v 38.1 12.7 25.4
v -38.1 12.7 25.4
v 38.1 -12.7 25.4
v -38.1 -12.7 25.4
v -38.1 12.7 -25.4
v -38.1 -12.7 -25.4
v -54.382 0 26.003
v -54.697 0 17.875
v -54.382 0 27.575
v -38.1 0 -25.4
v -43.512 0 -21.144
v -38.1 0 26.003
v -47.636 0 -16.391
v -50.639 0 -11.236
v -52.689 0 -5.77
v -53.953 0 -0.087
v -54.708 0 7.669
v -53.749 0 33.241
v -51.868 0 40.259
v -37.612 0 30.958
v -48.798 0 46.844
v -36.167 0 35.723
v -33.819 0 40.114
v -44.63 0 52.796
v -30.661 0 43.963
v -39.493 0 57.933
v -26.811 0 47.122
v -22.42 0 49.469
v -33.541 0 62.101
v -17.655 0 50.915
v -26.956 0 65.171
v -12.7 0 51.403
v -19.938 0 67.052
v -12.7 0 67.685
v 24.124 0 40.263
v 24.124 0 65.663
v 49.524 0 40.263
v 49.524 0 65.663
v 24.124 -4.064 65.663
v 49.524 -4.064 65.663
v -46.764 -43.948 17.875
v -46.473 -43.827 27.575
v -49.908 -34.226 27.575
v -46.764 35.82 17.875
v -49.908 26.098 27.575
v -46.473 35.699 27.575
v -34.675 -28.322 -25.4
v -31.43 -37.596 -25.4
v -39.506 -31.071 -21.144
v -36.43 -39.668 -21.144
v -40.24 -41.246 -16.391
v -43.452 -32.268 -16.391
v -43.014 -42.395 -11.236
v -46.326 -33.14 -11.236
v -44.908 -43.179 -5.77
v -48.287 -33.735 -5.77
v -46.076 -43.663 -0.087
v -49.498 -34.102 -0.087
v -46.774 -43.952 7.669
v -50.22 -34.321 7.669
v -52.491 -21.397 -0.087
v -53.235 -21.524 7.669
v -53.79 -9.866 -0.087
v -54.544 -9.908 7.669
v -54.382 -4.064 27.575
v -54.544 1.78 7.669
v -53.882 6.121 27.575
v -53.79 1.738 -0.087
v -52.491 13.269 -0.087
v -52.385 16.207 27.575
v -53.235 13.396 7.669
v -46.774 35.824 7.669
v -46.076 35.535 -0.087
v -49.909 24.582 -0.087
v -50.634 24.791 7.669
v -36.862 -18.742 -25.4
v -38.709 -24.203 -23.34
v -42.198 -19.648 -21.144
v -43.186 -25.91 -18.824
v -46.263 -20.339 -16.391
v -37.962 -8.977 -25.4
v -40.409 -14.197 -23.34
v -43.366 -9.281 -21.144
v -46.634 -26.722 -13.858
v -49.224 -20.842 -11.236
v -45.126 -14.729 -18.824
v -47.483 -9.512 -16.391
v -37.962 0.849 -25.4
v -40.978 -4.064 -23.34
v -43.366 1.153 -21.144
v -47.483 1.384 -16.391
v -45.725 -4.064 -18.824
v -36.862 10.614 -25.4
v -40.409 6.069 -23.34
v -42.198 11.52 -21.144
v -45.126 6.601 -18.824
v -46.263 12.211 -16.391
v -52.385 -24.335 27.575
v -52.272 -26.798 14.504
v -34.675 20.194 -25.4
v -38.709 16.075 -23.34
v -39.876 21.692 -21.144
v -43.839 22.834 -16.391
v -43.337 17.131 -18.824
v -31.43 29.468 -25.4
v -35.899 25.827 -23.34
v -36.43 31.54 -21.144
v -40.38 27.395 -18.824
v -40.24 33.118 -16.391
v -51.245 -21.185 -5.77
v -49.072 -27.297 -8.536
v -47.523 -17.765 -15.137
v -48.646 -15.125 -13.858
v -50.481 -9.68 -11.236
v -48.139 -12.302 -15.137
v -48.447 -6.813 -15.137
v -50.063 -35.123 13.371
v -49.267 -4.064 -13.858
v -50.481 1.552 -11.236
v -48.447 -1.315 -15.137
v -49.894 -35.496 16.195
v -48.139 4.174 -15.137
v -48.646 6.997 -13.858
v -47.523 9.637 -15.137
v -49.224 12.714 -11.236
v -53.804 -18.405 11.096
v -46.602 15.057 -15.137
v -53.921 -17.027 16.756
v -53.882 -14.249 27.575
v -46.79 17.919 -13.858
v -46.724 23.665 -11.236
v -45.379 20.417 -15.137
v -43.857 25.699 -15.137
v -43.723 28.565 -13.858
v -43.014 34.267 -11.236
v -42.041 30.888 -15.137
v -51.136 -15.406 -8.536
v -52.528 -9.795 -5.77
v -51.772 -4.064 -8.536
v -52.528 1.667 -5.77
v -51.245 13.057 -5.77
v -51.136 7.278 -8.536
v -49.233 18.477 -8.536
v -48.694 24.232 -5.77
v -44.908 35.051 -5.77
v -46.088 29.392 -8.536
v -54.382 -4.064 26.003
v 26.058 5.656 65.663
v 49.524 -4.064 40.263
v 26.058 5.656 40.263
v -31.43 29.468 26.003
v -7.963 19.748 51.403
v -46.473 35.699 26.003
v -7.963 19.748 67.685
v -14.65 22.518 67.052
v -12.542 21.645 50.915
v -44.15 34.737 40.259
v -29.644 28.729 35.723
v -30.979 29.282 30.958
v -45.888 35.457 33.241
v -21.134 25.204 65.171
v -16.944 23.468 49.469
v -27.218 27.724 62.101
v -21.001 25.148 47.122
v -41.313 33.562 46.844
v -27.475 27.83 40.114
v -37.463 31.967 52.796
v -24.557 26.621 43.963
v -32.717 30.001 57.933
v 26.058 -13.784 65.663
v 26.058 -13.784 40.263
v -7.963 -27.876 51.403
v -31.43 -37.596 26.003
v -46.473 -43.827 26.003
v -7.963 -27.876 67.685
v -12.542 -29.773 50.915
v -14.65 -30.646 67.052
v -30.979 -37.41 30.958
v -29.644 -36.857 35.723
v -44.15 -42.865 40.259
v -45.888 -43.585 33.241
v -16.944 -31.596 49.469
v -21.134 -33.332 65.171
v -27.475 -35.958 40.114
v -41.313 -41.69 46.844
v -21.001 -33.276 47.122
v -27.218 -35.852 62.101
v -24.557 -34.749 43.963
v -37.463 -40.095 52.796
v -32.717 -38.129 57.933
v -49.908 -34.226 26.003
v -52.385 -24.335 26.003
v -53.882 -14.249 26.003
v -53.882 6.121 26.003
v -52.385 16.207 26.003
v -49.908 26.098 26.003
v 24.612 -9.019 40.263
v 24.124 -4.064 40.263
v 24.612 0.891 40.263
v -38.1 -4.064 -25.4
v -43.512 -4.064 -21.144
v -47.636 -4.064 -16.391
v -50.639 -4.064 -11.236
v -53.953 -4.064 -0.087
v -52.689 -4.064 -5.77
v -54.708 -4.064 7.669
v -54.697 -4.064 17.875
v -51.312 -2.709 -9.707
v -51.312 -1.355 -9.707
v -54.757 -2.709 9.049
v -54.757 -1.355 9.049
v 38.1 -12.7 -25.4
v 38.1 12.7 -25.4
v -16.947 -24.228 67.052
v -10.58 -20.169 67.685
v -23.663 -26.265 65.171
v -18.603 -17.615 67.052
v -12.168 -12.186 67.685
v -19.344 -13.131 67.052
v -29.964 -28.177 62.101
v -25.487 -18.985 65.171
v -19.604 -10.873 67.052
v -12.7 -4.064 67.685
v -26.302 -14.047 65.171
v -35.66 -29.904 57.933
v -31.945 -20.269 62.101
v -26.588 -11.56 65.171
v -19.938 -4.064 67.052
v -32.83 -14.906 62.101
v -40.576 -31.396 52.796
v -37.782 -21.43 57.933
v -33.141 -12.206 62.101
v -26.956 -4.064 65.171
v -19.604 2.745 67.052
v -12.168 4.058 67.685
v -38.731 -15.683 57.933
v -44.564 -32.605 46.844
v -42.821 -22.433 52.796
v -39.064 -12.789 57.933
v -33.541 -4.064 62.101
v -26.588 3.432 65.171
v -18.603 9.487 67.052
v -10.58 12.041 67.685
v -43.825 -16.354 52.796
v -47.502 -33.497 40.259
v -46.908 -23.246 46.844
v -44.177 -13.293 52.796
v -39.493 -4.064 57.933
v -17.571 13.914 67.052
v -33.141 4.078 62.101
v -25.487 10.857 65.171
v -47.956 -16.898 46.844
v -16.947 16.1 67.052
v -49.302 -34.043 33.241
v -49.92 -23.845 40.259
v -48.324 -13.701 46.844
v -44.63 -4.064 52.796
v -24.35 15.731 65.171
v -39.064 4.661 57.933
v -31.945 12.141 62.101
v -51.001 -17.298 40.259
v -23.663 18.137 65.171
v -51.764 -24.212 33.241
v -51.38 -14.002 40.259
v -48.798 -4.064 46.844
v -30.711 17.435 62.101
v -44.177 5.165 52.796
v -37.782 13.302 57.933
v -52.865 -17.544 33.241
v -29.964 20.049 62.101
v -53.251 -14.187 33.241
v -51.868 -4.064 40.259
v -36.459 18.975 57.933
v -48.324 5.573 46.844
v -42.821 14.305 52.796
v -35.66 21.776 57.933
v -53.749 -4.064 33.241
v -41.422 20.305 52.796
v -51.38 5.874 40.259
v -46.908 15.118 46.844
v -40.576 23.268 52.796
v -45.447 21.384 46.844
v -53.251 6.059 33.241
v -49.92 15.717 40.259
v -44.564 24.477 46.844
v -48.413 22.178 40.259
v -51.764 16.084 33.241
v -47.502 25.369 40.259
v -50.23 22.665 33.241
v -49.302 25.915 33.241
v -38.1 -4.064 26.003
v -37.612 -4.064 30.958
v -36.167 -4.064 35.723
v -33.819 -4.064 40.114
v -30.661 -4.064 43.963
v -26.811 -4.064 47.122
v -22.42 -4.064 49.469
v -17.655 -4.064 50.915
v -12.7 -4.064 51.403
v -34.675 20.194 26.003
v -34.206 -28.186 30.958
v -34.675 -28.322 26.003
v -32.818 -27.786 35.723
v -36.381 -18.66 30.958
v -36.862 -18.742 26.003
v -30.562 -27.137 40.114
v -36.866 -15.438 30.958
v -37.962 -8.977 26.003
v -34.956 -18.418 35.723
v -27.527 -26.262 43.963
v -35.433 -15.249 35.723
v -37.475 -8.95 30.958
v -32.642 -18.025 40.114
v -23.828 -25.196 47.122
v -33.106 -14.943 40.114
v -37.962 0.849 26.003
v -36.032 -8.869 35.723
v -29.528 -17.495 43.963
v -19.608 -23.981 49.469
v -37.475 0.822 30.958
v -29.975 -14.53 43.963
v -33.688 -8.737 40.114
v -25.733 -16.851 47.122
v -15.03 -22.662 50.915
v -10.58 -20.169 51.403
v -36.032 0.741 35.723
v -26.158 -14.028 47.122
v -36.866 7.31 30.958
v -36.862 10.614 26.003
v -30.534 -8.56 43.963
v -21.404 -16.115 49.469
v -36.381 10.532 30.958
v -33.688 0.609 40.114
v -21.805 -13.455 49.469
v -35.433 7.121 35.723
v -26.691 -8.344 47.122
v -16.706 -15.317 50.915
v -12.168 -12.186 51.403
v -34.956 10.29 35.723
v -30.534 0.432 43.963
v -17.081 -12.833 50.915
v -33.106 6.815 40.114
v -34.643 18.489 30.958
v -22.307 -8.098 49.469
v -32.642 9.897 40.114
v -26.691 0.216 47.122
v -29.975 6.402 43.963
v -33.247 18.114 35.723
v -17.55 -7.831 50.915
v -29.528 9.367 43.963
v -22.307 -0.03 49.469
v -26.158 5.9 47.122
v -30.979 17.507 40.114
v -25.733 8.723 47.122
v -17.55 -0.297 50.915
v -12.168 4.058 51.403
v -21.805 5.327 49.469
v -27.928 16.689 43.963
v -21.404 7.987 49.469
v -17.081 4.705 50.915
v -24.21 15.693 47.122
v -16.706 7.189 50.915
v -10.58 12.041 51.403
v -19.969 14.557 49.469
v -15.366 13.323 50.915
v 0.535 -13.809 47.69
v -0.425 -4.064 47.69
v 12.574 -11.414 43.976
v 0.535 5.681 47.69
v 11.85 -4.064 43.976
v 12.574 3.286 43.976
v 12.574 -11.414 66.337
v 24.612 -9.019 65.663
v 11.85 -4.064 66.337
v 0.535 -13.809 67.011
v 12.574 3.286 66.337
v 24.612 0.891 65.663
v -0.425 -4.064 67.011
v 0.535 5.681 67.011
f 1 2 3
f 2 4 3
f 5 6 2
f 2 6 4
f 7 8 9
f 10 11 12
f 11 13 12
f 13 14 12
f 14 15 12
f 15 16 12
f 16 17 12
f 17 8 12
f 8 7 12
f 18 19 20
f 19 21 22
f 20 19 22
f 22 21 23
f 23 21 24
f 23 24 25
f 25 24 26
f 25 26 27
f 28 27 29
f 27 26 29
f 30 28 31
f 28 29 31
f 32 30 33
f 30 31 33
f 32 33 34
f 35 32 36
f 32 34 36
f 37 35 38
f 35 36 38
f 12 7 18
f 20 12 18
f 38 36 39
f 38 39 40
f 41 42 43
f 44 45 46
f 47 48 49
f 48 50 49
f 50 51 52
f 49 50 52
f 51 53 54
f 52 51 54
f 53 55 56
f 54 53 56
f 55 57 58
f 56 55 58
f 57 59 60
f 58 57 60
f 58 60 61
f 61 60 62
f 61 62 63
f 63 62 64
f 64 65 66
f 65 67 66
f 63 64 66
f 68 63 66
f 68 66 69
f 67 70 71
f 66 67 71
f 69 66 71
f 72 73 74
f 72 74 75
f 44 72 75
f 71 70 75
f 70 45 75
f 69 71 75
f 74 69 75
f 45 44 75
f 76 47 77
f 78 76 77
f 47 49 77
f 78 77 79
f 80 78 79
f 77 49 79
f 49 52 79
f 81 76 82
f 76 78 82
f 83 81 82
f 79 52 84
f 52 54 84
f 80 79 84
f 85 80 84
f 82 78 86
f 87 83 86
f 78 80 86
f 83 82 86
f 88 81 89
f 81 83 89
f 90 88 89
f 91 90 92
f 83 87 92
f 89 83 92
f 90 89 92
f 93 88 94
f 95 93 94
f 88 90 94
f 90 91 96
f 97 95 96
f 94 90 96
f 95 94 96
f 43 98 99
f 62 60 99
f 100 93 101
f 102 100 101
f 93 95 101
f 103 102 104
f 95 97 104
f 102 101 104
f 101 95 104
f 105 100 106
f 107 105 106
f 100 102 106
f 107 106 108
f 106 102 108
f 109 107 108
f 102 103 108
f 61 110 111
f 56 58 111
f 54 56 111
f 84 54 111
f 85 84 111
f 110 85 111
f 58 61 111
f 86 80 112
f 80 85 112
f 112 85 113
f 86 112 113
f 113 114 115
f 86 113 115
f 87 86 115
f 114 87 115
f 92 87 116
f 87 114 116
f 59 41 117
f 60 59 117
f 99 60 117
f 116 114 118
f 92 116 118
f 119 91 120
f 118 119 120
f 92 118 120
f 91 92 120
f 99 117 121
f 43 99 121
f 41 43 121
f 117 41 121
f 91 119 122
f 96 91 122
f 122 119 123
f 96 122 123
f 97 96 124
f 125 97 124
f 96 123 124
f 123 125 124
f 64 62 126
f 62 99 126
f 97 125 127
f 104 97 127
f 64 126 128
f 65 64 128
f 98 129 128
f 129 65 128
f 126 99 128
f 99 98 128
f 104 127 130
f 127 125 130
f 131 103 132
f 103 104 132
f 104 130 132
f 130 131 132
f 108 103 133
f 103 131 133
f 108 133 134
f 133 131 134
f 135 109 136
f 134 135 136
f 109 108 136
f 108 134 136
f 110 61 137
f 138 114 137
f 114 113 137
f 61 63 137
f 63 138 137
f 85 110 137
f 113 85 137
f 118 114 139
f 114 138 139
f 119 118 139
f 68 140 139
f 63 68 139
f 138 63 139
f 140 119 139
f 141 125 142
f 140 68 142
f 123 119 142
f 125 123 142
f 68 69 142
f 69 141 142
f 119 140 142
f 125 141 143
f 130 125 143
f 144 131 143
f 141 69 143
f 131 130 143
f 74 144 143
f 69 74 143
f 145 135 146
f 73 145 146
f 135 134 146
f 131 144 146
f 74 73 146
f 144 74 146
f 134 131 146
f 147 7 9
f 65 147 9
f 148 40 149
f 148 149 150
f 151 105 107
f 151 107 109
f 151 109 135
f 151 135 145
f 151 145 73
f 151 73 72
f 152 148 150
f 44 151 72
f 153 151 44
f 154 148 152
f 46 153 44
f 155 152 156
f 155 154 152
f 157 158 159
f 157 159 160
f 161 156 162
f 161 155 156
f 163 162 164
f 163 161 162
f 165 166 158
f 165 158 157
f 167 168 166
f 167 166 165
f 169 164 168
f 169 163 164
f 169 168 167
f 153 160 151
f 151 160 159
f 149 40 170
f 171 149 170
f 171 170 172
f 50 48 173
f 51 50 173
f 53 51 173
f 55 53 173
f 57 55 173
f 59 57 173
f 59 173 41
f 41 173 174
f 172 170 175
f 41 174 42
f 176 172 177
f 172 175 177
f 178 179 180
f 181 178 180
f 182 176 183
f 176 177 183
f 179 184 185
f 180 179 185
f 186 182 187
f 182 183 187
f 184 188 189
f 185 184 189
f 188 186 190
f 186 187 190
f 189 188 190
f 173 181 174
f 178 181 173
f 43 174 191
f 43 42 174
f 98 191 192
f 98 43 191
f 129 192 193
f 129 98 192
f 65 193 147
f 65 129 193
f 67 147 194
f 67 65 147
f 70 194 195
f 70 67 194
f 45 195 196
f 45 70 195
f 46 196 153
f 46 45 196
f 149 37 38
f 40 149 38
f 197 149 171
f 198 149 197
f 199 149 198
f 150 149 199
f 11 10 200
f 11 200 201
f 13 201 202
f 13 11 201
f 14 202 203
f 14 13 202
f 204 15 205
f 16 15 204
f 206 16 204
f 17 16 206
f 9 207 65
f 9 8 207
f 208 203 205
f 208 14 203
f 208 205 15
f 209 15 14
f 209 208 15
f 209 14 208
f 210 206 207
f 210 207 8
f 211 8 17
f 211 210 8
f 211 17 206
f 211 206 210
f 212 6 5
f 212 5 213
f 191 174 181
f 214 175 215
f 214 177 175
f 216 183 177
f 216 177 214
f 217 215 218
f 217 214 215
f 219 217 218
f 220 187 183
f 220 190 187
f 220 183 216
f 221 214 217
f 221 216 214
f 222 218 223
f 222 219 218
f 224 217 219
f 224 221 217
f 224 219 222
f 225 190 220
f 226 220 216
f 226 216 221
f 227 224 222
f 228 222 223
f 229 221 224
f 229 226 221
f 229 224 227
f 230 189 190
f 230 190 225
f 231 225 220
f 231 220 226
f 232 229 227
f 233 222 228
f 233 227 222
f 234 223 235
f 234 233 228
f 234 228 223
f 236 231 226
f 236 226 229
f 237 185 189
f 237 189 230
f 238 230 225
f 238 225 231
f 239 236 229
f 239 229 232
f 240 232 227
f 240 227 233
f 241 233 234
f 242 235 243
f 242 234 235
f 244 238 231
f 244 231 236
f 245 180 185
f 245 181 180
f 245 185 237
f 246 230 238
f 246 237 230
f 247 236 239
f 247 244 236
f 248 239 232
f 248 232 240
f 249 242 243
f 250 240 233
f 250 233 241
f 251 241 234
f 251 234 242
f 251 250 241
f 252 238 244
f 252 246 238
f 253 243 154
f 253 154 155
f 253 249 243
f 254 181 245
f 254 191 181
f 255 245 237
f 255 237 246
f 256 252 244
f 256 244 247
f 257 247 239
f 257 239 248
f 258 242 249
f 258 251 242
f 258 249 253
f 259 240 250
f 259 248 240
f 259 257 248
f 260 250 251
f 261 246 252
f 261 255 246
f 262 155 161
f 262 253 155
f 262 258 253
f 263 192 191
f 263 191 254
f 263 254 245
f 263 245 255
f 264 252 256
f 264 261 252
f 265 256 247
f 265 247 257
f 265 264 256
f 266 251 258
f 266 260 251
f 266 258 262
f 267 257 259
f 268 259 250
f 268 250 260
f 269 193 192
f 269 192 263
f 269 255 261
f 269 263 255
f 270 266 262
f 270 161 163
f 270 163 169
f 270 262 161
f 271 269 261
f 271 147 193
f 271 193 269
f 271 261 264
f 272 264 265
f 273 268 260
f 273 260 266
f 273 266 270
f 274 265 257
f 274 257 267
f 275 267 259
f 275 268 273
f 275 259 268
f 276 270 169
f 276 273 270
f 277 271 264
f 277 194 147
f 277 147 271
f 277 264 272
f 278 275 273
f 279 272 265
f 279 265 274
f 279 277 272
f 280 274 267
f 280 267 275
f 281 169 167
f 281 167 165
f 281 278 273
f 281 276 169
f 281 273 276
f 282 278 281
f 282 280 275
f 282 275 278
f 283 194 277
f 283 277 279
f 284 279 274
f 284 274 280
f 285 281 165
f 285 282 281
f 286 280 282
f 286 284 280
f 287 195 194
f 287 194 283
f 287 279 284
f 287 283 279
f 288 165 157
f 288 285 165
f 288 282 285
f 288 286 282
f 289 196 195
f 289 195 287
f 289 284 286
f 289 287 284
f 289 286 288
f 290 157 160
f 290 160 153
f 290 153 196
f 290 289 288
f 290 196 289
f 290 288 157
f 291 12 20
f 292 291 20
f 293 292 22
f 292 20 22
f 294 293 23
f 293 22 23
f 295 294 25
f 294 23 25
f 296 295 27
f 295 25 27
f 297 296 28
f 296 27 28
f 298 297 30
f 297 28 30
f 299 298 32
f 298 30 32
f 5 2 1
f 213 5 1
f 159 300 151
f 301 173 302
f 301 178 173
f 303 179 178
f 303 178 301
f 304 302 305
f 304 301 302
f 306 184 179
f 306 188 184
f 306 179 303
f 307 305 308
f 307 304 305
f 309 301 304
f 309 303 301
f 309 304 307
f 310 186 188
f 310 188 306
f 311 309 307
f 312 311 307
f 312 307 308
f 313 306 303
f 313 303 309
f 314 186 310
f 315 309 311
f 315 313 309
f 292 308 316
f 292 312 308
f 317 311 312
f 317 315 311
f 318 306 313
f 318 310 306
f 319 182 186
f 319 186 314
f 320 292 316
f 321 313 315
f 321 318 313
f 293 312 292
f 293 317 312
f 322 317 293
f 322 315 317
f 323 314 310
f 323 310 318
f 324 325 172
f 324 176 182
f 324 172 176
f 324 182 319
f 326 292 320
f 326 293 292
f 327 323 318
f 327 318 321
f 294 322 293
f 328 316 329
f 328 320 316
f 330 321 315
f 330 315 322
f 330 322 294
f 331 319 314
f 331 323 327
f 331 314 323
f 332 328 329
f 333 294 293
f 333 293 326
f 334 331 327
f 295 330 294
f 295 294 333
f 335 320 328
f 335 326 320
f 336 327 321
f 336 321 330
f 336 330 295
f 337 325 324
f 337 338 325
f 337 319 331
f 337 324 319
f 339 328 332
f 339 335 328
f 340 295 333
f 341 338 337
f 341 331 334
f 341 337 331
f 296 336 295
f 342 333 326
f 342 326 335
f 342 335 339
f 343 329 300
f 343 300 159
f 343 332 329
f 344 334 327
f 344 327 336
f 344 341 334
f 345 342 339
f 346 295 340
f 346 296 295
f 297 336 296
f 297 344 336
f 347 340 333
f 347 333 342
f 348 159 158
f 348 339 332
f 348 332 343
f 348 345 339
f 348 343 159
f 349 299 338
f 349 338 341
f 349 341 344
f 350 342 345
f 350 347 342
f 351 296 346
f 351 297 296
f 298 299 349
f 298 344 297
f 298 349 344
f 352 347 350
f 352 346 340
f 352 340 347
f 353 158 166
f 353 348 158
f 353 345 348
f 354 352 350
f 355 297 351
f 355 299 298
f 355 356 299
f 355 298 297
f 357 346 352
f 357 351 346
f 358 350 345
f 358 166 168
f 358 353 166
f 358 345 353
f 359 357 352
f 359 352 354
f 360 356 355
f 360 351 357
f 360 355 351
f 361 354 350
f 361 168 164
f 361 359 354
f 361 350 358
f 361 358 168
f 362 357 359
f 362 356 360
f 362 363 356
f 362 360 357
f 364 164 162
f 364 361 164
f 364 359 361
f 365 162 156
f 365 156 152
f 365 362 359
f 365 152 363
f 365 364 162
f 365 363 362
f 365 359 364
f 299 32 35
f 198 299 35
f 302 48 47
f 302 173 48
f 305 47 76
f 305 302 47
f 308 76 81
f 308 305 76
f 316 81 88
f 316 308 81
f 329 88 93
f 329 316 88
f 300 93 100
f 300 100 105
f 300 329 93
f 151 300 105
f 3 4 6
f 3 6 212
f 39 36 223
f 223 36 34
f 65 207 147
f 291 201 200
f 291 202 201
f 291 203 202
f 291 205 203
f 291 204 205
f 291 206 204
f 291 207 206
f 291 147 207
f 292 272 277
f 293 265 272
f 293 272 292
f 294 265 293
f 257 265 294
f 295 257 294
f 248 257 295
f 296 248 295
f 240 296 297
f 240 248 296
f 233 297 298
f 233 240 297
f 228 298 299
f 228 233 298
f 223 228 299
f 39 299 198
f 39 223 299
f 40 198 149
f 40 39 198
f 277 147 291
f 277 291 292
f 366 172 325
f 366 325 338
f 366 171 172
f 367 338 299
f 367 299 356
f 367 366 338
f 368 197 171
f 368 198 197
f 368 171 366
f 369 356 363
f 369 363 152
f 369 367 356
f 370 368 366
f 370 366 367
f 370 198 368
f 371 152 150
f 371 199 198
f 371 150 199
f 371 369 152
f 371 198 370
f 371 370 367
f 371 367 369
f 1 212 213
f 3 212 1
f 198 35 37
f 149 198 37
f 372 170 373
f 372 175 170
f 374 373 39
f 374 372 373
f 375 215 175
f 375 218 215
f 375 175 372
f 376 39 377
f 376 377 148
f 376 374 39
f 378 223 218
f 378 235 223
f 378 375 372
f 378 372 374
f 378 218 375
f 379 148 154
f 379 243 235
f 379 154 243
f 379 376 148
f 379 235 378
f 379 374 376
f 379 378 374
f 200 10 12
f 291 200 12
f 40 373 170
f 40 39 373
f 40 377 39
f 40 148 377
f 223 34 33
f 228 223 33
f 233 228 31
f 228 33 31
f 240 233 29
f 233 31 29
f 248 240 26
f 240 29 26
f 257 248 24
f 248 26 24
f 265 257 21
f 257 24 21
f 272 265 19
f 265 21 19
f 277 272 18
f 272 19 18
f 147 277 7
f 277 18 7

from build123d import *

# Parameters (mm, degrees)
F0_W          = 76.2
F0_H          = 50.8
F1_DEPTH      = 12.7
F0_W_2        = 25.4
F0_H_2        = 25.4
F2_DEPTH      = 4.064
F3_ANGLE_BACK = 22.5
F3_ANGLE      = 45


with BuildPart() as f1:
    # F0 (on Front) → F1 (new body, symmetric)
    with BuildSketch(Plane.XZ):
        Rectangle(F0_W, F0_H)
    extrude(amount=F1_DEPTH, both=True)


with BuildPart() as f2:
    # F0 (on Front) → F2 (new body)
    with BuildSketch(Plane.XZ):
        with BuildLine():
            Line((-38.1, -25.4), (-38.1, 25.4))
            Line((-38.1, 25.4), (-38.1, 26.0029239686))
            ThreePointArc((-38.1, 26.0029239686), (-30.6605122421, 43.9634362108), (-12.7, 51.4029239686))
            Line((-12.7, 51.4029239686), (24.1244458531, 40.2628784252))
            Line((24.1244458531, 40.2628784252), (24.1244458531, 65.6628784252))
            Line((24.1244458531, 65.6628784252), (-12.7, 67.6848888397))
            ThreePointArc((-12.7, 67.6848888397), (-42.1736000135, 55.4765239822), (-54.3819648711, 26.0029239686))
            Line((-54.3819648711, 26.0029239686), (-54.3819648711, 27.5753105516))
            add(Edge.make_bspline(
                [(-38.1, -25.4), (-58.1785941942, -12.335992187), (-54.6845670028, 10.260870759), (-54.3819648711, 27.5753105516)],
                knots=[0, 0, 0, 0, 54.9232516232, 54.9232516232, 54.9232516232, 54.9232516232], degree=3))
        make_face()
        with Locations((36.8244458531, 52.9628784252)):
            Rectangle(F0_W_2, F0_H_2)
    extrude(amount=F2_DEPTH)


with BuildPart() as f3:
    # F2_face (on face) → F3 (revolve)
    with BuildSketch(Plane(origin=(-10.8444306264, -4.064, 40.8061049324), x_dir=(1, 0, 0), z_dir=(0, -1, 0)), mode=Mode.PRIVATE) as f3_sk:
        with BuildLine():
            add(Edge.make_bspline(
                [(-27.2555693736, -66.2061049324), (-47.3341635678, -53.1420971194), (-43.8401363764, -30.5452341734), (-43.5375342447, -13.2307943809)],
                knots=[0, 0, 0, 0, 54.9232516232, 54.9232516232, 54.9232516232, 54.9232516232], degree=3))
            Line((-27.2555693736, -66.2061049324), (-27.2555693736, -14.8031809638))
            ThreePointArc((-27.2555693736, -14.8031809638), (-19.8160816158, 3.1573312783), (-1.8555693736, 10.5968190362))
            Line((-1.8555693736, 10.5968190362), (34.9688764795, -0.5432265072))
            Line((34.9688764795, -0.5432265072), (60.3688764795, -0.5432265072))
            Line((60.3688764795, -0.5432265072), (60.3688764795, 24.8567734928))
            Line((60.3688764795, 24.8567734928), (34.9688764795, 24.8567734928))
            Line((34.9688764795, 24.8567734928), (-1.8555693736, 26.8787839073))
            ThreePointArc((-1.8555693736, 26.8787839073), (-31.3291693871, 14.6704190497), (-43.5375342447, -14.8031809638))
            Line((-43.5375342447, -14.8031809638), (-43.5375342447, -13.2307943809))
        make_face()
    revolve(f3_sk.sketch.rotate(Axis((49.5244458531, -4.064, 52.9628784252), (0, 0, -1)), -F3_ANGLE_BACK), axis=Axis((49.5244458531, -4.064, 52.9628784252), (0, 0, -1)), revolution_arc=F3_ANGLE)


solid = Compound([f1.part, f2.part, f3.part])
